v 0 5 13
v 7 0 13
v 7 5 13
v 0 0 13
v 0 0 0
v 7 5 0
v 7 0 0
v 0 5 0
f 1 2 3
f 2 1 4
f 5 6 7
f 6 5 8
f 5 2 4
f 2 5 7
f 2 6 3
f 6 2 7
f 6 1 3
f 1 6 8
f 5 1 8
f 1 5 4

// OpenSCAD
// Generated by SolidPython 1.0.1 on 2020-07-29 00:46:55


cube(size = [7, 5, 13]);
/***********************************************
*********      SolidPython code:      **********
************************************************
 
# import packages: SolidPython
from solid import *
from solid.utils import *
from itertools import chain, combinations, permutations


class Resize:

    def __init__(self, scad_file):
        self.scad_file = scad_file
        #self.scad_file = import_scad(scad_file)
        # cone/cylinder param:
        self.r1 = 0
        self.r2 = 0
        self.h = 0
        # rectangular prism param:
        self.w = 0
        self.l = 0
        # ellipse param:
        self.r = 0

    # import OpenScad code (file name corresponds to shape)


    # classify shape + parameters
    def assign(self, param1, param2, param3):
        if self.scad_file == 'cone.scad':
            self.r1 = param1
            self.r2 = param2
            self.h = param3
        elif self.scad_file == 'cylinder.scad':
            self.r1 = param1
            self.r2 = param2
            self.h = param3
        elif self.scad_file == 'rectangularPrism.scad':
            self.h = param1
            self.l = param2
            self.w = param3
        else:
            self.r = param1
            self.h = param2

    # resize parameters
    def iterate(self):
        x = range(3, 20, 2)
        i = 1
        if self.scad_file == 'cone.scad':
            tempList = list(permutations(x, 2))
            for temp in tempList:
                param1 = temp[0]
                param2 = temp[1]
                filepath = 'produced_scad_files/' + 'cone' + str(param1) + '_' + str(param2) + '_' + '.scad'
                scad_render_to_file(cylinder(h=param1, r1=param2, r2=0), filepath)

        elif self.scad_file == 'cylinder.scad':
            tempList = list(permutations(x, 3))
            for temp in tempList:
                param1 = temp[0]
                param2 = temp[1]
                filepath = 'produced_scad_files/' + 'cylinder' + str(param1) + '_' + str(param2) + '_' + '.scad'
                scad_render_to_file(cylinder(h=param1, r1=param2, r2=param2), filepath)

        elif self.scad_file == 'rectangularPrism.scad':
            tempList = list(permutations(x, 3))
            for temp in tempList:
                param1 = temp[0]
                param2 = temp[1]
                param3 = temp[2]
                filepath = 'produced_scad_files/' + 'rectangularPrism' + str(param1) + '_' + str(param2) + '_' + str(
                    param3) + '.scad'
                scad_render_to_file(cube(size=(param1, param2, param3)), filepath)

        elif self.scad_file == 'ellipse.scad':
            tempList = list(permutations(x, 4))
            for temp in tempList:
                param1 = temp[0]
                param2 = temp[1]
                param3 = temp[2]
                param4 = temp[3]
                filepath = 'produced_scad_files/' + 'ellipse' + str(param1) + '_' + str(param2) + '_' + str(param3) + '_' + str(param4) + '.scad'
                scad_render_to_file(scale([param1, param2, param3])(sphere(r=param4)), filepath)

    def render_to_scadfile(self):
        scad_render_to_file(scad, 'example.scad') 
 
************************************************/
